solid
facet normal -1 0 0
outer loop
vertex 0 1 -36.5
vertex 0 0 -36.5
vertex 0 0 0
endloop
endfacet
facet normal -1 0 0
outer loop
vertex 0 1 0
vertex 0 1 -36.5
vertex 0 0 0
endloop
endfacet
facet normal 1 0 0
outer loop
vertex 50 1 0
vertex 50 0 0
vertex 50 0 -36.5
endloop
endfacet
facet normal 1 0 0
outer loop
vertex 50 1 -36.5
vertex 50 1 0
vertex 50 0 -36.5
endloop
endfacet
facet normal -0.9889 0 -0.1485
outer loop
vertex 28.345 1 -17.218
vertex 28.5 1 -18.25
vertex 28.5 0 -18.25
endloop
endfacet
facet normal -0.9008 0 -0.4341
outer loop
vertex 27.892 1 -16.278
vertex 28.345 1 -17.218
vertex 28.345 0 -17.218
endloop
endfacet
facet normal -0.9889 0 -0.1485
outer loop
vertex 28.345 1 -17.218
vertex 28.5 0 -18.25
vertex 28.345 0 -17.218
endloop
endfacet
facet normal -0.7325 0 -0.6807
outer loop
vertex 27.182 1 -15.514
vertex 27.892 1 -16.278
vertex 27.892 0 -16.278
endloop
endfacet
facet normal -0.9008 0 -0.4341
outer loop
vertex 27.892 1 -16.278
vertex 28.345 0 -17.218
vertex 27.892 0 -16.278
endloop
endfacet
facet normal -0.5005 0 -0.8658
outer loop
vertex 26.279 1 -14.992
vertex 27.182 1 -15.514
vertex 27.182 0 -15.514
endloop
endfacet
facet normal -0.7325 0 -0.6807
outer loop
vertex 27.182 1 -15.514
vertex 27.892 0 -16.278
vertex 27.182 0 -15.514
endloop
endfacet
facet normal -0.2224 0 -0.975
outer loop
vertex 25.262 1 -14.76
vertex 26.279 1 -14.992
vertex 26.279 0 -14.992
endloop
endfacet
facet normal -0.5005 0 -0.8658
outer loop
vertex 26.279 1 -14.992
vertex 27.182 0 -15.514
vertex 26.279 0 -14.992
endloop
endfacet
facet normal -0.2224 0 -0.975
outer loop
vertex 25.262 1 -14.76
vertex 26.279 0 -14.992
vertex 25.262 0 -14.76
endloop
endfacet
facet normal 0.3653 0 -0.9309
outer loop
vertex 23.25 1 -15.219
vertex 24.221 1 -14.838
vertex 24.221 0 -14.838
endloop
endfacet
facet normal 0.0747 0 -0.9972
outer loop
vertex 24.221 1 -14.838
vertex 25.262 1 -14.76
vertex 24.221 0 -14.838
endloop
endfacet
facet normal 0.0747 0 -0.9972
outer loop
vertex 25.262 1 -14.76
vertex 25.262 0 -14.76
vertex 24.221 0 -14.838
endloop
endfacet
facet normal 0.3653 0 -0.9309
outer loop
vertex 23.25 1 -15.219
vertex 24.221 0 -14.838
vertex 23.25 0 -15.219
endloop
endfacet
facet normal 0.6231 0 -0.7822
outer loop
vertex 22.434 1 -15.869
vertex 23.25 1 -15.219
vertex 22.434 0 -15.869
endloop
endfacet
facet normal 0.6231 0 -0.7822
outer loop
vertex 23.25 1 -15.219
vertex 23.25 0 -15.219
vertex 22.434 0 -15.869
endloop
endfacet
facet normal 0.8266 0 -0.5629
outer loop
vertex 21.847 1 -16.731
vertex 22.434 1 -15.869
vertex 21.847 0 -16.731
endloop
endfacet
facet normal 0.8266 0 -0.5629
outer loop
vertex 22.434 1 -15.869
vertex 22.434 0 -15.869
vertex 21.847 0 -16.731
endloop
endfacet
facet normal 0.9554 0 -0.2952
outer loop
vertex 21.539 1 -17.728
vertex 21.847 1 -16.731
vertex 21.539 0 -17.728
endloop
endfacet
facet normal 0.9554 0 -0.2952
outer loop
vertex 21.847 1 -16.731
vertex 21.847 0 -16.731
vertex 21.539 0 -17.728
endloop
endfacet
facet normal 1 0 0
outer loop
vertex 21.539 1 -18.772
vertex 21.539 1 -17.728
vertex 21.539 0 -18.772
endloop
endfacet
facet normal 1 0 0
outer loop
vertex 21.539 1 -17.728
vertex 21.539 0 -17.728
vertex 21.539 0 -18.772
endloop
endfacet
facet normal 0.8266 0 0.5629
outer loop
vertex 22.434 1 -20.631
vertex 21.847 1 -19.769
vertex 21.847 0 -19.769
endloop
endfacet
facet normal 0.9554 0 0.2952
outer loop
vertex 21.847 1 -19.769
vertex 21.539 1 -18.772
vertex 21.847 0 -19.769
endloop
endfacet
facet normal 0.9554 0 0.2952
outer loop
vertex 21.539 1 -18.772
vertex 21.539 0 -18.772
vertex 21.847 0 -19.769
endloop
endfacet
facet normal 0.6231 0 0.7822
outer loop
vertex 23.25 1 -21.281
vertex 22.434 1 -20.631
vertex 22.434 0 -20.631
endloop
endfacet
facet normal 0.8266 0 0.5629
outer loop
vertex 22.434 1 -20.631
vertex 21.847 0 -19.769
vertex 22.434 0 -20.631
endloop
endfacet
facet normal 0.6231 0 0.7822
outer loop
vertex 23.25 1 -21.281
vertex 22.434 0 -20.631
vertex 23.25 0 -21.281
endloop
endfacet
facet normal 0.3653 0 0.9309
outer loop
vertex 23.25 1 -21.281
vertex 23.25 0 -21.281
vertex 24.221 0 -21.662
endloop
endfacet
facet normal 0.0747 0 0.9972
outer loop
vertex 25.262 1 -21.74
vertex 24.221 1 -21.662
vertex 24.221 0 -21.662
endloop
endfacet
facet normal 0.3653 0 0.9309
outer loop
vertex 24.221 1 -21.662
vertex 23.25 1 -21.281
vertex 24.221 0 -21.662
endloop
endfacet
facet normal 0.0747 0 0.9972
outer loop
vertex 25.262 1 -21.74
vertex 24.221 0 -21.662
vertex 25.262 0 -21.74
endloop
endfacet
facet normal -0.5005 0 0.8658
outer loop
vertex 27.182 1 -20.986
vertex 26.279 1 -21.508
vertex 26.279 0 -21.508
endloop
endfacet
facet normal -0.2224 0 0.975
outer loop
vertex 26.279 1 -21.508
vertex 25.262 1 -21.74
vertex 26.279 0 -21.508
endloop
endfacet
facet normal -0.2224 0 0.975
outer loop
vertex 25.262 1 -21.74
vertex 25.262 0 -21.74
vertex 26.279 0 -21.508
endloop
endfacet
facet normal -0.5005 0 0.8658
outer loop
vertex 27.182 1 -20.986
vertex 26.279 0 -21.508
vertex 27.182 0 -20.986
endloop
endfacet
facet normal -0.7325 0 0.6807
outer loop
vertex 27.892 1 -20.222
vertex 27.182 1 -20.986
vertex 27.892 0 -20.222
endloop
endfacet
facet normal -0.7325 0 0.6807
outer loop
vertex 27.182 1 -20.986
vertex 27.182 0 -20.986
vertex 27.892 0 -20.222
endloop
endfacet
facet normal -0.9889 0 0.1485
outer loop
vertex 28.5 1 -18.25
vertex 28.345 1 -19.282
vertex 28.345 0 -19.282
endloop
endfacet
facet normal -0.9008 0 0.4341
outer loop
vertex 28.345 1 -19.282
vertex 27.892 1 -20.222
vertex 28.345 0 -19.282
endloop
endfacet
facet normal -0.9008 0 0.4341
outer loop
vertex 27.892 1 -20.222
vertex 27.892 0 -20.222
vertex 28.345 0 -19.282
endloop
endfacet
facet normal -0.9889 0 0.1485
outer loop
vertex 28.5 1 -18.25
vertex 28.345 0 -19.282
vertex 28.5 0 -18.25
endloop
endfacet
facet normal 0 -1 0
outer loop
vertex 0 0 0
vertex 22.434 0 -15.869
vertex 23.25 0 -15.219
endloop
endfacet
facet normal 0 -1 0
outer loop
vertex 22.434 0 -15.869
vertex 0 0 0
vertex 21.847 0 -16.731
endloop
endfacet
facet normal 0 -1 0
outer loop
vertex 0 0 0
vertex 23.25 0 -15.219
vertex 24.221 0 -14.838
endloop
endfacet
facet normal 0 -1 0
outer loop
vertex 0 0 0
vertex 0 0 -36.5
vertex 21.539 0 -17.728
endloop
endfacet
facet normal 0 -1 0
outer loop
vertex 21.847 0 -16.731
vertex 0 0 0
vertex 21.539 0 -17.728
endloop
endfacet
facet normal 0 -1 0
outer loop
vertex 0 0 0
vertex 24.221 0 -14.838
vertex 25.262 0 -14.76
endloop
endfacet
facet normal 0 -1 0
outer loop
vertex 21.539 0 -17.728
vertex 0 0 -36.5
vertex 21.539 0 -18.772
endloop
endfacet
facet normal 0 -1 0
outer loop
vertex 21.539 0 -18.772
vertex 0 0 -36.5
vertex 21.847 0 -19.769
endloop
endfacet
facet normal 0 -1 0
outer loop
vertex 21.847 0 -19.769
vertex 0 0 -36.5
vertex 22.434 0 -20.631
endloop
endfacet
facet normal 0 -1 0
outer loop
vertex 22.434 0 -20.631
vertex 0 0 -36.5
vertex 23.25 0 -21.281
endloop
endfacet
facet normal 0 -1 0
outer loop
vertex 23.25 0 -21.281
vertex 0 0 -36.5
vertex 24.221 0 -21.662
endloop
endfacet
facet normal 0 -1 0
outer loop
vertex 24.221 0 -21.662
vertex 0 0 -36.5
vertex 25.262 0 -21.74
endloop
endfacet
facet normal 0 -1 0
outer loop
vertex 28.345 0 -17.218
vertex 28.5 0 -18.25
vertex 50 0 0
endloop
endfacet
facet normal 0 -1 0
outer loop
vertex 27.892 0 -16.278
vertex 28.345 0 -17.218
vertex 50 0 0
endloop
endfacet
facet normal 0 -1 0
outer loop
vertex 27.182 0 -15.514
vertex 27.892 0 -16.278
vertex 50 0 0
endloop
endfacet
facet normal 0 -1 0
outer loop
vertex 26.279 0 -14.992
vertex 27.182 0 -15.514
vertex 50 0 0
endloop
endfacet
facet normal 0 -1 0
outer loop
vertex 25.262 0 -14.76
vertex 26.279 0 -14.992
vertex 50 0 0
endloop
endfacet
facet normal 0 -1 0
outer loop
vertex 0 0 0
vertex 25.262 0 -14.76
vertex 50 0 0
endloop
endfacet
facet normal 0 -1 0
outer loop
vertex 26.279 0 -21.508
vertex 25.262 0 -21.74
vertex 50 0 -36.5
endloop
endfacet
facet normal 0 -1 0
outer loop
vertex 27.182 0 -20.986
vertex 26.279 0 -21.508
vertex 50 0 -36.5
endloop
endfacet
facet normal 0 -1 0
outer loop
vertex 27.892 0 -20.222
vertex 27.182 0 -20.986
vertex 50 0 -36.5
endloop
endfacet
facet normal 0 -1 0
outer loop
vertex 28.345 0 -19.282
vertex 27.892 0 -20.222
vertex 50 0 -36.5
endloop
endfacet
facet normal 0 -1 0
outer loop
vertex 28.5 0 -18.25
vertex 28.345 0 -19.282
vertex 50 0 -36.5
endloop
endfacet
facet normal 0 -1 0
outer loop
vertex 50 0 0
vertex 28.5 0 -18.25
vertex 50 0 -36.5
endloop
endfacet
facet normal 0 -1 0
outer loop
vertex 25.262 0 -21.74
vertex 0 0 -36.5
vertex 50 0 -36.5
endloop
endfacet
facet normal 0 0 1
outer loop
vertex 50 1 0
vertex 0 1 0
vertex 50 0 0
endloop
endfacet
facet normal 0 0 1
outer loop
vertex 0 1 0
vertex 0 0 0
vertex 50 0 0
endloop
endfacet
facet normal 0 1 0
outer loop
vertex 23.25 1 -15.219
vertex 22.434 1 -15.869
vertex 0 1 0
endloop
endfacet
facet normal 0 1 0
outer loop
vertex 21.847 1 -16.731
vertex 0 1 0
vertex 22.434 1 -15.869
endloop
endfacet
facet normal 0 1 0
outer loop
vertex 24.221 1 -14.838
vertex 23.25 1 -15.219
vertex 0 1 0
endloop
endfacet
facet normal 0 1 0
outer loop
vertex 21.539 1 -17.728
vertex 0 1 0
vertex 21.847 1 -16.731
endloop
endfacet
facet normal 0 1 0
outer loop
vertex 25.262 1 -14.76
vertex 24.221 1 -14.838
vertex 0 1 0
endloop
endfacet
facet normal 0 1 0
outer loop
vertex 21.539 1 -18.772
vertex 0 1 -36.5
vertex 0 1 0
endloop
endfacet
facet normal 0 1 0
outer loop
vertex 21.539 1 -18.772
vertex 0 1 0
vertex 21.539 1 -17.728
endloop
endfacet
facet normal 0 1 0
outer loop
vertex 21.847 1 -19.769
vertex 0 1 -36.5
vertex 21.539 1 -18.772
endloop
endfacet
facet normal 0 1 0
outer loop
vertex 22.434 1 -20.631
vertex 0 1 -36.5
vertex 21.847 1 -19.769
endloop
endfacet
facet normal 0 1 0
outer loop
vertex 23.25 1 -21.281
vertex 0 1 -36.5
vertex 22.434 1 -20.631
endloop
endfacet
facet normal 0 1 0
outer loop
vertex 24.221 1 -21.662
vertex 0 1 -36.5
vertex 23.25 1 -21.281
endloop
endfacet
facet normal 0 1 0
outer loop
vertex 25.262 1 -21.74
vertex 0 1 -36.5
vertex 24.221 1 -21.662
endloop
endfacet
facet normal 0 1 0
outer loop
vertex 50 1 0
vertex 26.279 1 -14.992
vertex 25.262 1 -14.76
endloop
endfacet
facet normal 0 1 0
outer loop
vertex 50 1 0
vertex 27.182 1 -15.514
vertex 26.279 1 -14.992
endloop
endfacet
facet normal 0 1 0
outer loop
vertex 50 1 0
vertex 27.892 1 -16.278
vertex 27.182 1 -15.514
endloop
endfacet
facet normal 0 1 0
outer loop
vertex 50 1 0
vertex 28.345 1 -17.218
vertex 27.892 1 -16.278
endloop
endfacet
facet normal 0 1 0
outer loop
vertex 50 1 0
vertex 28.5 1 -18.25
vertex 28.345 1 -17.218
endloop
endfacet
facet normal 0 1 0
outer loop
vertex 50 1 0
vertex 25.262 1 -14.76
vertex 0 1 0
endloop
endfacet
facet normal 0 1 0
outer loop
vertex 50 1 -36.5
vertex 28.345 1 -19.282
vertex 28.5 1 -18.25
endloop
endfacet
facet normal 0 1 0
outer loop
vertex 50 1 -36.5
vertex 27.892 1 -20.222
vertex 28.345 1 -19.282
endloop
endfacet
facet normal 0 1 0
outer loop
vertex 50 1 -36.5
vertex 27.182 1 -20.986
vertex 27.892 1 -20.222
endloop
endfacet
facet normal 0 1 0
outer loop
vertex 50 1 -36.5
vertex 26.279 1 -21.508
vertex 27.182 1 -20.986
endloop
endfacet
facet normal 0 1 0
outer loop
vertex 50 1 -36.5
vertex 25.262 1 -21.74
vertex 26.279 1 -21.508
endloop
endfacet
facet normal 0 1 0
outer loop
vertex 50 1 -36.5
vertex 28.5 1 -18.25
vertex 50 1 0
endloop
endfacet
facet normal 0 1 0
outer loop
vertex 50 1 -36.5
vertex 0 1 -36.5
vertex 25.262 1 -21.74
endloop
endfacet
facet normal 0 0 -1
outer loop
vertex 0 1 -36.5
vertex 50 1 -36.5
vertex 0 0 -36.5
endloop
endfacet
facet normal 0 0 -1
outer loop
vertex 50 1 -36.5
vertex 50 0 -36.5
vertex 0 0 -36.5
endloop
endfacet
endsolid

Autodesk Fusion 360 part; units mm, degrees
sketch "Sketch1" plane through (0, 0, 0) normal (0, 1, 0) x (1, 0, 0)
  line L0 (0, 0) -> (50, 0)
  line L1 (50, 0) -> (50, 36.5)
  line L2 (50, 36.5) -> (0, 36.5)
  line L3 (0, 36.5) -> (0, 0)
  line L4 (0, 36.5) -> (50, 0)
  line L5 (50, 36.5) -> (0, 0)
  circle A0 centre (25, 18.25) radius 3.5
  dimension "d1" = 50
  dimension "d2" = 36.5
  dimension "d3" = 7
extrude "Extrude1" add sketch "Sketch1" along normal blind 1 contours L0 L4 L5 A0 | L3 L4 L5 A0 | L1 L4 L5 A0 | L2 L4 L5 A0
